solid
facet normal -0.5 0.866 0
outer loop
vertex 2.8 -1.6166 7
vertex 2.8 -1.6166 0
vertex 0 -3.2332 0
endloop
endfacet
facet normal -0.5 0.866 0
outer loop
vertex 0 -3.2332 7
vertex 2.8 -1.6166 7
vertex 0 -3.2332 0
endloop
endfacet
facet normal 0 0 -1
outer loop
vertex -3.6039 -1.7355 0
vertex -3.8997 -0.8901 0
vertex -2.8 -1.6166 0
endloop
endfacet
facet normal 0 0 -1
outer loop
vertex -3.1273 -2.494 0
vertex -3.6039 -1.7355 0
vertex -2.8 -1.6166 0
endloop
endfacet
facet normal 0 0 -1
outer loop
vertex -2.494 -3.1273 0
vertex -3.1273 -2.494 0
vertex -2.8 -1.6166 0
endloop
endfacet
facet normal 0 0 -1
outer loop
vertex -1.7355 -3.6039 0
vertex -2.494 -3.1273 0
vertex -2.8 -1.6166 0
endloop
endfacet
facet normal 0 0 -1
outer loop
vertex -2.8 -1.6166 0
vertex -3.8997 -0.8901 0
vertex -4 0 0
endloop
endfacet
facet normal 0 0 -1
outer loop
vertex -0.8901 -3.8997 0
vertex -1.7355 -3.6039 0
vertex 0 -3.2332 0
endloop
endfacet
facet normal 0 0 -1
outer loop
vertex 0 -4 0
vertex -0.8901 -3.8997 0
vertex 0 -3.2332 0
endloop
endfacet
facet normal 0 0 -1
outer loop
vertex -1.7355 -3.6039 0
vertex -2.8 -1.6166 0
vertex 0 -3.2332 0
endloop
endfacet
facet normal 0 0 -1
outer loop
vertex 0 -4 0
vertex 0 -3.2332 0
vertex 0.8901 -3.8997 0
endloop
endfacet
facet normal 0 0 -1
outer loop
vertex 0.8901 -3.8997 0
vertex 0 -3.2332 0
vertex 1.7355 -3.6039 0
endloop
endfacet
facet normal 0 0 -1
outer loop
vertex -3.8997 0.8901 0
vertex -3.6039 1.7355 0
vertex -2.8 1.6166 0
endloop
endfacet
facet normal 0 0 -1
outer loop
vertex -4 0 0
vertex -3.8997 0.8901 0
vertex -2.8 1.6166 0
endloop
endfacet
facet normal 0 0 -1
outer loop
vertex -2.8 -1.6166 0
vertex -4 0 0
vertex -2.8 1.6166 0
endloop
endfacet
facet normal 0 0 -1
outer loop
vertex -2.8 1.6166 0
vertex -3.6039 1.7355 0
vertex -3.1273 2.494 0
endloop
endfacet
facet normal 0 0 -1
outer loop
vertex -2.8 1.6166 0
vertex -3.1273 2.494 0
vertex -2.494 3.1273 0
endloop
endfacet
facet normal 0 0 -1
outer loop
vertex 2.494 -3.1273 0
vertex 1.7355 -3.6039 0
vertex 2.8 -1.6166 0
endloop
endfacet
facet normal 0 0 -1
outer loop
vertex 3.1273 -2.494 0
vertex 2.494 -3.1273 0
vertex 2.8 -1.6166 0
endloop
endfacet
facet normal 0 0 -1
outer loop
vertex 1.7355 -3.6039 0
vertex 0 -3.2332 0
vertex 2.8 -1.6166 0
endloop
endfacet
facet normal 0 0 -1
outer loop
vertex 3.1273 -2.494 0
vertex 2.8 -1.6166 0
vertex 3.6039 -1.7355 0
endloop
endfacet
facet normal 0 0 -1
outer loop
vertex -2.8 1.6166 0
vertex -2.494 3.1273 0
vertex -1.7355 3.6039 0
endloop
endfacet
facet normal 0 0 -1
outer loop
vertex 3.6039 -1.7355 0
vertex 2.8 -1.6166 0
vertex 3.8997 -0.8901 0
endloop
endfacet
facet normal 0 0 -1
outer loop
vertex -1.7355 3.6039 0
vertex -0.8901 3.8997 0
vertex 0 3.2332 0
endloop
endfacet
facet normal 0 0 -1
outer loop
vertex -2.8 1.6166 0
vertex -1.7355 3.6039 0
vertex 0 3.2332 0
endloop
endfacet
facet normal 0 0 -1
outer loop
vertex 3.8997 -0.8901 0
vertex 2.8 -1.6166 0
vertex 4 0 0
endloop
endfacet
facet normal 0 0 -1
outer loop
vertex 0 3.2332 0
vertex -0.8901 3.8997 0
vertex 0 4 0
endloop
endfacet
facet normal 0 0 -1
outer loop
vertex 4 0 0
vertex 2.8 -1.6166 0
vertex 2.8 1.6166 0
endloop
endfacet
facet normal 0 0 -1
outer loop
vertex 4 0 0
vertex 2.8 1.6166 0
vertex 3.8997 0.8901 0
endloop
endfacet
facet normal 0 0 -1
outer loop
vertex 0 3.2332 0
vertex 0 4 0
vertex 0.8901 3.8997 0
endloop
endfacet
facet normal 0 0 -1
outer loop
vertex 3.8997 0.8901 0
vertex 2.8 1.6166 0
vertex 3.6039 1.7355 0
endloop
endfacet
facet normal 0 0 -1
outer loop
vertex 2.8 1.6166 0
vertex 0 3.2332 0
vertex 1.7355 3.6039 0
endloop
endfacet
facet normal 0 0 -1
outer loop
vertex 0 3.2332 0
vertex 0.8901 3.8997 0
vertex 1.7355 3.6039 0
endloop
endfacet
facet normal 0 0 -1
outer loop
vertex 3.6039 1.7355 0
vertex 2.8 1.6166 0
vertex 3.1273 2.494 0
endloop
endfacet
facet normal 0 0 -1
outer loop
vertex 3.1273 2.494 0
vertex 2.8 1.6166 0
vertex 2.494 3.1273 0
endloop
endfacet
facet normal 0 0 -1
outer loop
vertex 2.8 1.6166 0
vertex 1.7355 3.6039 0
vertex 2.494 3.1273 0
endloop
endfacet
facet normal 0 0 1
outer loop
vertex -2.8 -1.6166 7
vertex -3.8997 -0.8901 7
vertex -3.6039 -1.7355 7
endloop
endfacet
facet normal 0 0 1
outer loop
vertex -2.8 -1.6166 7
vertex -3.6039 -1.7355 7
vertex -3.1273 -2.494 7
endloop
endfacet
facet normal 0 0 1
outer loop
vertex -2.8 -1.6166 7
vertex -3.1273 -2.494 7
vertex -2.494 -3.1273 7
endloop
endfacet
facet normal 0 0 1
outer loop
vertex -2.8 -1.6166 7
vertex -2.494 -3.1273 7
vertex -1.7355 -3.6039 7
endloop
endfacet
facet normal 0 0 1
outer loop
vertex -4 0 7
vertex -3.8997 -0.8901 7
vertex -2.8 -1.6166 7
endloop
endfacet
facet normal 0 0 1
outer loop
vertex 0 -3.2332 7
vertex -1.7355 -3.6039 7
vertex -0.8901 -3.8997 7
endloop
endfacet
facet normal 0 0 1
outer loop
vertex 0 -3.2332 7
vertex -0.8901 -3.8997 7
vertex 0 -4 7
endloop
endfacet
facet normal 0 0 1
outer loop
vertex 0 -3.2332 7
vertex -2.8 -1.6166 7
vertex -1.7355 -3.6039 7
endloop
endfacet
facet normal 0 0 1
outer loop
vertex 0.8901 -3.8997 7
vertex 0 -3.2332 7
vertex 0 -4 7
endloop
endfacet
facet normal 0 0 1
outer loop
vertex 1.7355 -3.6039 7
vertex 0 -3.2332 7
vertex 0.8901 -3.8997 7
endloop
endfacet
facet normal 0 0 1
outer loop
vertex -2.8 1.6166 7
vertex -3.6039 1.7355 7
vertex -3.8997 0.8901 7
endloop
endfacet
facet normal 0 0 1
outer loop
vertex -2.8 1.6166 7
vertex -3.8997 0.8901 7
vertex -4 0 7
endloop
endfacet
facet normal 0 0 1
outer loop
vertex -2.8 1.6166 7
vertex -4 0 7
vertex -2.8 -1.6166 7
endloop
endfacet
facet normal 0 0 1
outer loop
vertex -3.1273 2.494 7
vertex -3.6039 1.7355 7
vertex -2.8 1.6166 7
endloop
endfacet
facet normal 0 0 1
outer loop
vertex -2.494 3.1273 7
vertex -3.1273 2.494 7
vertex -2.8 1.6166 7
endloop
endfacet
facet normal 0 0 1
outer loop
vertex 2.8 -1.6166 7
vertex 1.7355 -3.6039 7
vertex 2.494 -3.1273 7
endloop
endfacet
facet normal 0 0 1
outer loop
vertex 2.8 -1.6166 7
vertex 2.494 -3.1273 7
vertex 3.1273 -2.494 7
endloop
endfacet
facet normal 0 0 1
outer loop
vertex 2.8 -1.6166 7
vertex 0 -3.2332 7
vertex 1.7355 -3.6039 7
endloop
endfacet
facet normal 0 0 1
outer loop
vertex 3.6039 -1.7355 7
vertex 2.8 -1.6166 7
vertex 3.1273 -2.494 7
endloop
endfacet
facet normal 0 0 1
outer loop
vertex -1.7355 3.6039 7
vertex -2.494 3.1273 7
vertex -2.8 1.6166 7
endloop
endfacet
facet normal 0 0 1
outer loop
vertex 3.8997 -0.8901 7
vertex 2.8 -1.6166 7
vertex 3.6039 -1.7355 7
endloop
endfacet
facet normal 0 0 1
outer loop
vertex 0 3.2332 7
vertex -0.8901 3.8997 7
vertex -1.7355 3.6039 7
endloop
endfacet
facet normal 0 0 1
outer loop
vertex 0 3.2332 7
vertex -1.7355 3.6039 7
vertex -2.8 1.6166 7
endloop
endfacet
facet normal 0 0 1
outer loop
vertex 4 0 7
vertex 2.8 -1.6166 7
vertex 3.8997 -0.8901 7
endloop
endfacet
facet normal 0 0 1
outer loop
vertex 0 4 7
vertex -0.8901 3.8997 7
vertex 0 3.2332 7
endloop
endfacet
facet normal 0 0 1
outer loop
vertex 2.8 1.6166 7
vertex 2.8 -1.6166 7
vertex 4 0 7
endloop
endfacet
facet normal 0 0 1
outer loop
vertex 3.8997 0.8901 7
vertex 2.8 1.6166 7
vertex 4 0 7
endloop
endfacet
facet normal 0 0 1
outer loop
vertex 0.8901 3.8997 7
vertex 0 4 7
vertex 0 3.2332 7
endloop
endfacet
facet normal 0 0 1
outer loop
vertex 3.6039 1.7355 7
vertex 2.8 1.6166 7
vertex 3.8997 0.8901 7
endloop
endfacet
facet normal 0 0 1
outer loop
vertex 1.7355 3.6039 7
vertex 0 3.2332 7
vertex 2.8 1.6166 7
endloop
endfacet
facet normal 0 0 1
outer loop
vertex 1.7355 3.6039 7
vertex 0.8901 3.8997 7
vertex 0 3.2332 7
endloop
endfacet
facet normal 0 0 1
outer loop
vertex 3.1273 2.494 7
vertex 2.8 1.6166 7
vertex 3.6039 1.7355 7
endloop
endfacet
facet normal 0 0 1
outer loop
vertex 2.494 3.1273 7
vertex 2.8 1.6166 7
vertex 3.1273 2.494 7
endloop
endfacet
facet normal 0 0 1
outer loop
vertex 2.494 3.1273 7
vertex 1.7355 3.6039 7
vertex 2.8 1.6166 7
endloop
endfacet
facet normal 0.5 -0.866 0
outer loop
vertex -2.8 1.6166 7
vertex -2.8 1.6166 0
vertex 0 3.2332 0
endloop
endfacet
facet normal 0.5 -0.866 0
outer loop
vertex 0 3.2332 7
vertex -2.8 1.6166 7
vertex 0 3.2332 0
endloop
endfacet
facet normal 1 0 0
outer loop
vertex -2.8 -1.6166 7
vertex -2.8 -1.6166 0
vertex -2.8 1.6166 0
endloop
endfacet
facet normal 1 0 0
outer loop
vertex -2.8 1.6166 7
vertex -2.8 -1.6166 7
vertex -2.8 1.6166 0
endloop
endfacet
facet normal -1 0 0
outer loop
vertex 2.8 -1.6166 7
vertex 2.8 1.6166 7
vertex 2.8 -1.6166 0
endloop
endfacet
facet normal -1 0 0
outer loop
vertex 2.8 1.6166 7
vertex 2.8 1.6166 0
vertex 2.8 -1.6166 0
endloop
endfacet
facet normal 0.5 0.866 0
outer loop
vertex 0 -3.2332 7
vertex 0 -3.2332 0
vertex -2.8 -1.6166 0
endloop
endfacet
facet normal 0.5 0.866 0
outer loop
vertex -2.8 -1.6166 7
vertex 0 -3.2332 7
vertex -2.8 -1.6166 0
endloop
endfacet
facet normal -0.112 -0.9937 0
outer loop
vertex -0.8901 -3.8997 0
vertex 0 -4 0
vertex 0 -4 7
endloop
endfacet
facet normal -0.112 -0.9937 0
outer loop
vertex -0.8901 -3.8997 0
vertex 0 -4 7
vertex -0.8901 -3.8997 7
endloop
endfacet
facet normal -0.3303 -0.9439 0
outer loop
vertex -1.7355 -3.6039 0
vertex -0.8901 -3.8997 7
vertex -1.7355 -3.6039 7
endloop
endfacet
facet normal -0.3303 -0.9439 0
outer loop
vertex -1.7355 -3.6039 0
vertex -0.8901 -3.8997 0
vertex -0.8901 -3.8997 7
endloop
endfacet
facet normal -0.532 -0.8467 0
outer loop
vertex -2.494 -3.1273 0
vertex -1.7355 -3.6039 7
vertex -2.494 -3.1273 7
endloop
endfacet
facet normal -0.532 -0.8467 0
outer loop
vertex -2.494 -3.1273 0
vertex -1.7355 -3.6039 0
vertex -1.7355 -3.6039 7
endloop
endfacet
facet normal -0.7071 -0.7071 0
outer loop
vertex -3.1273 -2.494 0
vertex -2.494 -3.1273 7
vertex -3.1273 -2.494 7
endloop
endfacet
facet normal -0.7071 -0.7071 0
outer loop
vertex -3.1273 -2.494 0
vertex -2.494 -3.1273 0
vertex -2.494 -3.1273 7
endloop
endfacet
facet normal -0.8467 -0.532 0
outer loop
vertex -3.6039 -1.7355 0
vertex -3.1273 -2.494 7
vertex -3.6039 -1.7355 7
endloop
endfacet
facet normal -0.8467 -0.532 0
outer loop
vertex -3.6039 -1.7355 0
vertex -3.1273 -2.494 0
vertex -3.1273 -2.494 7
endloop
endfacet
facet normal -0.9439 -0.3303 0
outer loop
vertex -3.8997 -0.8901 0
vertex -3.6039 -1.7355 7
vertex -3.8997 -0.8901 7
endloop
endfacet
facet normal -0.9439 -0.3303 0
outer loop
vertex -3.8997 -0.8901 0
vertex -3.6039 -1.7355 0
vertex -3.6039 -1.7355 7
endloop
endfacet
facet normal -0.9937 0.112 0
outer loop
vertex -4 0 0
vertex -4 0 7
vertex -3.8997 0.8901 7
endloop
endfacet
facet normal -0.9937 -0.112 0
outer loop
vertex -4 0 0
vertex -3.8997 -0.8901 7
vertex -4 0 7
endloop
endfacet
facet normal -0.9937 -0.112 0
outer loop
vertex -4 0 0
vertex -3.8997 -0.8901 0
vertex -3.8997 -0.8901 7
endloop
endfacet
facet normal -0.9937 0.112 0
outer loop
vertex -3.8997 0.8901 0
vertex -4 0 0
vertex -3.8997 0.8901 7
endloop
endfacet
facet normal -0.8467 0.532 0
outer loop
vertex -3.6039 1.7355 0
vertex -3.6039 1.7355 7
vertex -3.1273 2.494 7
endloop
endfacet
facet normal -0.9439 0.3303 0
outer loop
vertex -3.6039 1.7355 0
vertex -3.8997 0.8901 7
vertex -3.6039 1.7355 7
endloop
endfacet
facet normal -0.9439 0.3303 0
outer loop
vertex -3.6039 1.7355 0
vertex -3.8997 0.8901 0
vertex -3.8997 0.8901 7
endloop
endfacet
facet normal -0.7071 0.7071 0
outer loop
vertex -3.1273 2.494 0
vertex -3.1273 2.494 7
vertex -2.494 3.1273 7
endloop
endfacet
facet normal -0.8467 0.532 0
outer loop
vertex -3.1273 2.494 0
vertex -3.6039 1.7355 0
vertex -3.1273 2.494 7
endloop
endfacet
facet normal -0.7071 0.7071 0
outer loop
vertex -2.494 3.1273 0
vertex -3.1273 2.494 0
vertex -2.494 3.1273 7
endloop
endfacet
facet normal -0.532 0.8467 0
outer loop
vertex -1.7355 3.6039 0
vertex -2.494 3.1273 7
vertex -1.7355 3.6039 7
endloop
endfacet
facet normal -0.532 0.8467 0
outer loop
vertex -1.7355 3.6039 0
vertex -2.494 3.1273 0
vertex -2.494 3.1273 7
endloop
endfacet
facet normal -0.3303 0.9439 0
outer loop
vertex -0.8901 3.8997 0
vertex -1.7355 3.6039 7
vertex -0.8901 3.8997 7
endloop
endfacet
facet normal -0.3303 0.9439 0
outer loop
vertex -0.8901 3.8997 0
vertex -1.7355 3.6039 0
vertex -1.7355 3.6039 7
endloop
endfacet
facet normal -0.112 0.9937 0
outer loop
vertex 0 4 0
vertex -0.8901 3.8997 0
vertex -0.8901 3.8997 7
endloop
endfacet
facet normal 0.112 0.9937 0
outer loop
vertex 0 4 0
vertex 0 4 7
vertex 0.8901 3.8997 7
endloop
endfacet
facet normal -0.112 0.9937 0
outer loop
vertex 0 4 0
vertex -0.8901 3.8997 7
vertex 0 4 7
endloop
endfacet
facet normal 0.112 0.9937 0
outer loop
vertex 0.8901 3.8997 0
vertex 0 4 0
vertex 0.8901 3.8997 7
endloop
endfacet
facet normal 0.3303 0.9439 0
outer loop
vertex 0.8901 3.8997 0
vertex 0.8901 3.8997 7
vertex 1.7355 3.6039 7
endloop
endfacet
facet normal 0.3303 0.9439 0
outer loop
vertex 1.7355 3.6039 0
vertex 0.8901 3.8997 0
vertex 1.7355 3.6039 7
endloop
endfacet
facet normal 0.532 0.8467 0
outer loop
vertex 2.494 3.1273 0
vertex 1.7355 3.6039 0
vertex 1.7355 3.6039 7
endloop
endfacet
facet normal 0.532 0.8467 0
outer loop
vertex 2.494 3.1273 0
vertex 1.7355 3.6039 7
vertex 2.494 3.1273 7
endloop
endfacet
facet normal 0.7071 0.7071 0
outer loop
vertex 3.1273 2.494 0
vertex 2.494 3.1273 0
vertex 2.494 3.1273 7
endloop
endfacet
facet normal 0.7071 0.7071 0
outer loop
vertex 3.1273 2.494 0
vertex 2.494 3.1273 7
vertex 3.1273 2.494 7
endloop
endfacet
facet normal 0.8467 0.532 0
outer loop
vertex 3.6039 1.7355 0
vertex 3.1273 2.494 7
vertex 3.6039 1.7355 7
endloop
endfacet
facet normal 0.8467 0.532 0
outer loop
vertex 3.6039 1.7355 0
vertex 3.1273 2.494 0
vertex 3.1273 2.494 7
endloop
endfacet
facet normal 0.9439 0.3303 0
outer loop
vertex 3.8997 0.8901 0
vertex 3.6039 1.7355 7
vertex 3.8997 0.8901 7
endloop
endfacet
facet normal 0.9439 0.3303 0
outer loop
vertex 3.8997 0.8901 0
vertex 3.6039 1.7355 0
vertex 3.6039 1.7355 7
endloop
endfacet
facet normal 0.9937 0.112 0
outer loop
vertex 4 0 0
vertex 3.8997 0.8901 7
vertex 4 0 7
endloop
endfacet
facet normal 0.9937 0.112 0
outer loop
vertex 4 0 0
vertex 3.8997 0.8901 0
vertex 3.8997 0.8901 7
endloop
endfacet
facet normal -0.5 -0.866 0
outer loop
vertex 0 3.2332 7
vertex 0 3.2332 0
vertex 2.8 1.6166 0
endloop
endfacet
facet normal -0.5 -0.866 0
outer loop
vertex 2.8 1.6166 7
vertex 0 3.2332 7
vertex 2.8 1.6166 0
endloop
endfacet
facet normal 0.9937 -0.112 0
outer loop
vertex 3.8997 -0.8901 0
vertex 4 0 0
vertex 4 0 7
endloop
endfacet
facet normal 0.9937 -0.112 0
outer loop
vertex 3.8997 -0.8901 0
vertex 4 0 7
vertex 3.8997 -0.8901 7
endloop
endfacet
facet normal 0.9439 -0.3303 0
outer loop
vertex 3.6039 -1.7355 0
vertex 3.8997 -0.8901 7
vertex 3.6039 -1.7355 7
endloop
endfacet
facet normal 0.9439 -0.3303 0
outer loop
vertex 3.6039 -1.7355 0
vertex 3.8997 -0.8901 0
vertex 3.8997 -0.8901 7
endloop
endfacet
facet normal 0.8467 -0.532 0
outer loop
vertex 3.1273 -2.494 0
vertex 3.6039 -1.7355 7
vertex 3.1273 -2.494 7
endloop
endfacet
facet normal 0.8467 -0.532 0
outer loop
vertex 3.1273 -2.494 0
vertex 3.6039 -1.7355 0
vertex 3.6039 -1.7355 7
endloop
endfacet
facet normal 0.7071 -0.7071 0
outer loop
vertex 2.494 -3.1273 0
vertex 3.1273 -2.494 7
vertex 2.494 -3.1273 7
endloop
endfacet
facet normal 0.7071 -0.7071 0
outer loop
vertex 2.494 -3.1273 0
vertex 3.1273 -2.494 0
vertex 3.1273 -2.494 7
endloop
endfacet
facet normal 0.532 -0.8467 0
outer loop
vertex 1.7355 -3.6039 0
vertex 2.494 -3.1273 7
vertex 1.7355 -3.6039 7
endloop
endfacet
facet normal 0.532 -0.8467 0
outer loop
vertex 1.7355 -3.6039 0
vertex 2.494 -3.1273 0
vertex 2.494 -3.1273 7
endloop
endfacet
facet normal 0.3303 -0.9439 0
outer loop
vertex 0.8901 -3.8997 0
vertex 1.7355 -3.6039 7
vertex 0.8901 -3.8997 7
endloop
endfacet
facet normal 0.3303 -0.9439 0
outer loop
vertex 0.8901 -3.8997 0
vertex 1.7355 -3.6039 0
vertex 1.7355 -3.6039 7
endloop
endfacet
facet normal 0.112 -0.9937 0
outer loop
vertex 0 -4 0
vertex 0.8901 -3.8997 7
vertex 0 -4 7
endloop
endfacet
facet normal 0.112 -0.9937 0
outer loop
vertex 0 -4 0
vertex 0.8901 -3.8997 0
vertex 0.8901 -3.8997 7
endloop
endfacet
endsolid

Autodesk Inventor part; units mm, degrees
ref_plane "YZ Plane" through (0, 0, 0) normal (1, 0, 0) x (0, 1, 0)
ref_plane "XZ Plane" through (0, 0, 0) normal (0, 1, 0) x (-1, 0, 0)
ref_plane "XY Plane" through (0, 0, 0) normal (0, 0, 1) x (1, 0, 0)
sketch "Boceto1" plane through (0, 0, 0) normal (0, 0, 1) x (1, 0, 0)
  circle A0 centre (0, 0) radius 4
  line L0 (0, 3.2332) -> (2.8, 1.6166)
  line L1 (2.8, 1.6166) -> (2.8, -1.6166)
  line L2 (2.8, -1.6166) -> (0, -3.2332)
  line L3 (0, -3.2332) -> (-2.8, -1.6166)
  line L4 (-2.8, -1.6166) -> (-2.8, 1.6166)
  line L5 (-2.8, 1.6166) -> (0, 3.2332)
  line L6 (0, -3.2332) -> (0, -4)
  point P0 (2.8, 0)
  dimension "d0" = 8
  dimension "d1" = 5.6
extrude "Extrusión1" add sketch "Boceto1" along normal blind 7
properties part number "AcopleRod"
